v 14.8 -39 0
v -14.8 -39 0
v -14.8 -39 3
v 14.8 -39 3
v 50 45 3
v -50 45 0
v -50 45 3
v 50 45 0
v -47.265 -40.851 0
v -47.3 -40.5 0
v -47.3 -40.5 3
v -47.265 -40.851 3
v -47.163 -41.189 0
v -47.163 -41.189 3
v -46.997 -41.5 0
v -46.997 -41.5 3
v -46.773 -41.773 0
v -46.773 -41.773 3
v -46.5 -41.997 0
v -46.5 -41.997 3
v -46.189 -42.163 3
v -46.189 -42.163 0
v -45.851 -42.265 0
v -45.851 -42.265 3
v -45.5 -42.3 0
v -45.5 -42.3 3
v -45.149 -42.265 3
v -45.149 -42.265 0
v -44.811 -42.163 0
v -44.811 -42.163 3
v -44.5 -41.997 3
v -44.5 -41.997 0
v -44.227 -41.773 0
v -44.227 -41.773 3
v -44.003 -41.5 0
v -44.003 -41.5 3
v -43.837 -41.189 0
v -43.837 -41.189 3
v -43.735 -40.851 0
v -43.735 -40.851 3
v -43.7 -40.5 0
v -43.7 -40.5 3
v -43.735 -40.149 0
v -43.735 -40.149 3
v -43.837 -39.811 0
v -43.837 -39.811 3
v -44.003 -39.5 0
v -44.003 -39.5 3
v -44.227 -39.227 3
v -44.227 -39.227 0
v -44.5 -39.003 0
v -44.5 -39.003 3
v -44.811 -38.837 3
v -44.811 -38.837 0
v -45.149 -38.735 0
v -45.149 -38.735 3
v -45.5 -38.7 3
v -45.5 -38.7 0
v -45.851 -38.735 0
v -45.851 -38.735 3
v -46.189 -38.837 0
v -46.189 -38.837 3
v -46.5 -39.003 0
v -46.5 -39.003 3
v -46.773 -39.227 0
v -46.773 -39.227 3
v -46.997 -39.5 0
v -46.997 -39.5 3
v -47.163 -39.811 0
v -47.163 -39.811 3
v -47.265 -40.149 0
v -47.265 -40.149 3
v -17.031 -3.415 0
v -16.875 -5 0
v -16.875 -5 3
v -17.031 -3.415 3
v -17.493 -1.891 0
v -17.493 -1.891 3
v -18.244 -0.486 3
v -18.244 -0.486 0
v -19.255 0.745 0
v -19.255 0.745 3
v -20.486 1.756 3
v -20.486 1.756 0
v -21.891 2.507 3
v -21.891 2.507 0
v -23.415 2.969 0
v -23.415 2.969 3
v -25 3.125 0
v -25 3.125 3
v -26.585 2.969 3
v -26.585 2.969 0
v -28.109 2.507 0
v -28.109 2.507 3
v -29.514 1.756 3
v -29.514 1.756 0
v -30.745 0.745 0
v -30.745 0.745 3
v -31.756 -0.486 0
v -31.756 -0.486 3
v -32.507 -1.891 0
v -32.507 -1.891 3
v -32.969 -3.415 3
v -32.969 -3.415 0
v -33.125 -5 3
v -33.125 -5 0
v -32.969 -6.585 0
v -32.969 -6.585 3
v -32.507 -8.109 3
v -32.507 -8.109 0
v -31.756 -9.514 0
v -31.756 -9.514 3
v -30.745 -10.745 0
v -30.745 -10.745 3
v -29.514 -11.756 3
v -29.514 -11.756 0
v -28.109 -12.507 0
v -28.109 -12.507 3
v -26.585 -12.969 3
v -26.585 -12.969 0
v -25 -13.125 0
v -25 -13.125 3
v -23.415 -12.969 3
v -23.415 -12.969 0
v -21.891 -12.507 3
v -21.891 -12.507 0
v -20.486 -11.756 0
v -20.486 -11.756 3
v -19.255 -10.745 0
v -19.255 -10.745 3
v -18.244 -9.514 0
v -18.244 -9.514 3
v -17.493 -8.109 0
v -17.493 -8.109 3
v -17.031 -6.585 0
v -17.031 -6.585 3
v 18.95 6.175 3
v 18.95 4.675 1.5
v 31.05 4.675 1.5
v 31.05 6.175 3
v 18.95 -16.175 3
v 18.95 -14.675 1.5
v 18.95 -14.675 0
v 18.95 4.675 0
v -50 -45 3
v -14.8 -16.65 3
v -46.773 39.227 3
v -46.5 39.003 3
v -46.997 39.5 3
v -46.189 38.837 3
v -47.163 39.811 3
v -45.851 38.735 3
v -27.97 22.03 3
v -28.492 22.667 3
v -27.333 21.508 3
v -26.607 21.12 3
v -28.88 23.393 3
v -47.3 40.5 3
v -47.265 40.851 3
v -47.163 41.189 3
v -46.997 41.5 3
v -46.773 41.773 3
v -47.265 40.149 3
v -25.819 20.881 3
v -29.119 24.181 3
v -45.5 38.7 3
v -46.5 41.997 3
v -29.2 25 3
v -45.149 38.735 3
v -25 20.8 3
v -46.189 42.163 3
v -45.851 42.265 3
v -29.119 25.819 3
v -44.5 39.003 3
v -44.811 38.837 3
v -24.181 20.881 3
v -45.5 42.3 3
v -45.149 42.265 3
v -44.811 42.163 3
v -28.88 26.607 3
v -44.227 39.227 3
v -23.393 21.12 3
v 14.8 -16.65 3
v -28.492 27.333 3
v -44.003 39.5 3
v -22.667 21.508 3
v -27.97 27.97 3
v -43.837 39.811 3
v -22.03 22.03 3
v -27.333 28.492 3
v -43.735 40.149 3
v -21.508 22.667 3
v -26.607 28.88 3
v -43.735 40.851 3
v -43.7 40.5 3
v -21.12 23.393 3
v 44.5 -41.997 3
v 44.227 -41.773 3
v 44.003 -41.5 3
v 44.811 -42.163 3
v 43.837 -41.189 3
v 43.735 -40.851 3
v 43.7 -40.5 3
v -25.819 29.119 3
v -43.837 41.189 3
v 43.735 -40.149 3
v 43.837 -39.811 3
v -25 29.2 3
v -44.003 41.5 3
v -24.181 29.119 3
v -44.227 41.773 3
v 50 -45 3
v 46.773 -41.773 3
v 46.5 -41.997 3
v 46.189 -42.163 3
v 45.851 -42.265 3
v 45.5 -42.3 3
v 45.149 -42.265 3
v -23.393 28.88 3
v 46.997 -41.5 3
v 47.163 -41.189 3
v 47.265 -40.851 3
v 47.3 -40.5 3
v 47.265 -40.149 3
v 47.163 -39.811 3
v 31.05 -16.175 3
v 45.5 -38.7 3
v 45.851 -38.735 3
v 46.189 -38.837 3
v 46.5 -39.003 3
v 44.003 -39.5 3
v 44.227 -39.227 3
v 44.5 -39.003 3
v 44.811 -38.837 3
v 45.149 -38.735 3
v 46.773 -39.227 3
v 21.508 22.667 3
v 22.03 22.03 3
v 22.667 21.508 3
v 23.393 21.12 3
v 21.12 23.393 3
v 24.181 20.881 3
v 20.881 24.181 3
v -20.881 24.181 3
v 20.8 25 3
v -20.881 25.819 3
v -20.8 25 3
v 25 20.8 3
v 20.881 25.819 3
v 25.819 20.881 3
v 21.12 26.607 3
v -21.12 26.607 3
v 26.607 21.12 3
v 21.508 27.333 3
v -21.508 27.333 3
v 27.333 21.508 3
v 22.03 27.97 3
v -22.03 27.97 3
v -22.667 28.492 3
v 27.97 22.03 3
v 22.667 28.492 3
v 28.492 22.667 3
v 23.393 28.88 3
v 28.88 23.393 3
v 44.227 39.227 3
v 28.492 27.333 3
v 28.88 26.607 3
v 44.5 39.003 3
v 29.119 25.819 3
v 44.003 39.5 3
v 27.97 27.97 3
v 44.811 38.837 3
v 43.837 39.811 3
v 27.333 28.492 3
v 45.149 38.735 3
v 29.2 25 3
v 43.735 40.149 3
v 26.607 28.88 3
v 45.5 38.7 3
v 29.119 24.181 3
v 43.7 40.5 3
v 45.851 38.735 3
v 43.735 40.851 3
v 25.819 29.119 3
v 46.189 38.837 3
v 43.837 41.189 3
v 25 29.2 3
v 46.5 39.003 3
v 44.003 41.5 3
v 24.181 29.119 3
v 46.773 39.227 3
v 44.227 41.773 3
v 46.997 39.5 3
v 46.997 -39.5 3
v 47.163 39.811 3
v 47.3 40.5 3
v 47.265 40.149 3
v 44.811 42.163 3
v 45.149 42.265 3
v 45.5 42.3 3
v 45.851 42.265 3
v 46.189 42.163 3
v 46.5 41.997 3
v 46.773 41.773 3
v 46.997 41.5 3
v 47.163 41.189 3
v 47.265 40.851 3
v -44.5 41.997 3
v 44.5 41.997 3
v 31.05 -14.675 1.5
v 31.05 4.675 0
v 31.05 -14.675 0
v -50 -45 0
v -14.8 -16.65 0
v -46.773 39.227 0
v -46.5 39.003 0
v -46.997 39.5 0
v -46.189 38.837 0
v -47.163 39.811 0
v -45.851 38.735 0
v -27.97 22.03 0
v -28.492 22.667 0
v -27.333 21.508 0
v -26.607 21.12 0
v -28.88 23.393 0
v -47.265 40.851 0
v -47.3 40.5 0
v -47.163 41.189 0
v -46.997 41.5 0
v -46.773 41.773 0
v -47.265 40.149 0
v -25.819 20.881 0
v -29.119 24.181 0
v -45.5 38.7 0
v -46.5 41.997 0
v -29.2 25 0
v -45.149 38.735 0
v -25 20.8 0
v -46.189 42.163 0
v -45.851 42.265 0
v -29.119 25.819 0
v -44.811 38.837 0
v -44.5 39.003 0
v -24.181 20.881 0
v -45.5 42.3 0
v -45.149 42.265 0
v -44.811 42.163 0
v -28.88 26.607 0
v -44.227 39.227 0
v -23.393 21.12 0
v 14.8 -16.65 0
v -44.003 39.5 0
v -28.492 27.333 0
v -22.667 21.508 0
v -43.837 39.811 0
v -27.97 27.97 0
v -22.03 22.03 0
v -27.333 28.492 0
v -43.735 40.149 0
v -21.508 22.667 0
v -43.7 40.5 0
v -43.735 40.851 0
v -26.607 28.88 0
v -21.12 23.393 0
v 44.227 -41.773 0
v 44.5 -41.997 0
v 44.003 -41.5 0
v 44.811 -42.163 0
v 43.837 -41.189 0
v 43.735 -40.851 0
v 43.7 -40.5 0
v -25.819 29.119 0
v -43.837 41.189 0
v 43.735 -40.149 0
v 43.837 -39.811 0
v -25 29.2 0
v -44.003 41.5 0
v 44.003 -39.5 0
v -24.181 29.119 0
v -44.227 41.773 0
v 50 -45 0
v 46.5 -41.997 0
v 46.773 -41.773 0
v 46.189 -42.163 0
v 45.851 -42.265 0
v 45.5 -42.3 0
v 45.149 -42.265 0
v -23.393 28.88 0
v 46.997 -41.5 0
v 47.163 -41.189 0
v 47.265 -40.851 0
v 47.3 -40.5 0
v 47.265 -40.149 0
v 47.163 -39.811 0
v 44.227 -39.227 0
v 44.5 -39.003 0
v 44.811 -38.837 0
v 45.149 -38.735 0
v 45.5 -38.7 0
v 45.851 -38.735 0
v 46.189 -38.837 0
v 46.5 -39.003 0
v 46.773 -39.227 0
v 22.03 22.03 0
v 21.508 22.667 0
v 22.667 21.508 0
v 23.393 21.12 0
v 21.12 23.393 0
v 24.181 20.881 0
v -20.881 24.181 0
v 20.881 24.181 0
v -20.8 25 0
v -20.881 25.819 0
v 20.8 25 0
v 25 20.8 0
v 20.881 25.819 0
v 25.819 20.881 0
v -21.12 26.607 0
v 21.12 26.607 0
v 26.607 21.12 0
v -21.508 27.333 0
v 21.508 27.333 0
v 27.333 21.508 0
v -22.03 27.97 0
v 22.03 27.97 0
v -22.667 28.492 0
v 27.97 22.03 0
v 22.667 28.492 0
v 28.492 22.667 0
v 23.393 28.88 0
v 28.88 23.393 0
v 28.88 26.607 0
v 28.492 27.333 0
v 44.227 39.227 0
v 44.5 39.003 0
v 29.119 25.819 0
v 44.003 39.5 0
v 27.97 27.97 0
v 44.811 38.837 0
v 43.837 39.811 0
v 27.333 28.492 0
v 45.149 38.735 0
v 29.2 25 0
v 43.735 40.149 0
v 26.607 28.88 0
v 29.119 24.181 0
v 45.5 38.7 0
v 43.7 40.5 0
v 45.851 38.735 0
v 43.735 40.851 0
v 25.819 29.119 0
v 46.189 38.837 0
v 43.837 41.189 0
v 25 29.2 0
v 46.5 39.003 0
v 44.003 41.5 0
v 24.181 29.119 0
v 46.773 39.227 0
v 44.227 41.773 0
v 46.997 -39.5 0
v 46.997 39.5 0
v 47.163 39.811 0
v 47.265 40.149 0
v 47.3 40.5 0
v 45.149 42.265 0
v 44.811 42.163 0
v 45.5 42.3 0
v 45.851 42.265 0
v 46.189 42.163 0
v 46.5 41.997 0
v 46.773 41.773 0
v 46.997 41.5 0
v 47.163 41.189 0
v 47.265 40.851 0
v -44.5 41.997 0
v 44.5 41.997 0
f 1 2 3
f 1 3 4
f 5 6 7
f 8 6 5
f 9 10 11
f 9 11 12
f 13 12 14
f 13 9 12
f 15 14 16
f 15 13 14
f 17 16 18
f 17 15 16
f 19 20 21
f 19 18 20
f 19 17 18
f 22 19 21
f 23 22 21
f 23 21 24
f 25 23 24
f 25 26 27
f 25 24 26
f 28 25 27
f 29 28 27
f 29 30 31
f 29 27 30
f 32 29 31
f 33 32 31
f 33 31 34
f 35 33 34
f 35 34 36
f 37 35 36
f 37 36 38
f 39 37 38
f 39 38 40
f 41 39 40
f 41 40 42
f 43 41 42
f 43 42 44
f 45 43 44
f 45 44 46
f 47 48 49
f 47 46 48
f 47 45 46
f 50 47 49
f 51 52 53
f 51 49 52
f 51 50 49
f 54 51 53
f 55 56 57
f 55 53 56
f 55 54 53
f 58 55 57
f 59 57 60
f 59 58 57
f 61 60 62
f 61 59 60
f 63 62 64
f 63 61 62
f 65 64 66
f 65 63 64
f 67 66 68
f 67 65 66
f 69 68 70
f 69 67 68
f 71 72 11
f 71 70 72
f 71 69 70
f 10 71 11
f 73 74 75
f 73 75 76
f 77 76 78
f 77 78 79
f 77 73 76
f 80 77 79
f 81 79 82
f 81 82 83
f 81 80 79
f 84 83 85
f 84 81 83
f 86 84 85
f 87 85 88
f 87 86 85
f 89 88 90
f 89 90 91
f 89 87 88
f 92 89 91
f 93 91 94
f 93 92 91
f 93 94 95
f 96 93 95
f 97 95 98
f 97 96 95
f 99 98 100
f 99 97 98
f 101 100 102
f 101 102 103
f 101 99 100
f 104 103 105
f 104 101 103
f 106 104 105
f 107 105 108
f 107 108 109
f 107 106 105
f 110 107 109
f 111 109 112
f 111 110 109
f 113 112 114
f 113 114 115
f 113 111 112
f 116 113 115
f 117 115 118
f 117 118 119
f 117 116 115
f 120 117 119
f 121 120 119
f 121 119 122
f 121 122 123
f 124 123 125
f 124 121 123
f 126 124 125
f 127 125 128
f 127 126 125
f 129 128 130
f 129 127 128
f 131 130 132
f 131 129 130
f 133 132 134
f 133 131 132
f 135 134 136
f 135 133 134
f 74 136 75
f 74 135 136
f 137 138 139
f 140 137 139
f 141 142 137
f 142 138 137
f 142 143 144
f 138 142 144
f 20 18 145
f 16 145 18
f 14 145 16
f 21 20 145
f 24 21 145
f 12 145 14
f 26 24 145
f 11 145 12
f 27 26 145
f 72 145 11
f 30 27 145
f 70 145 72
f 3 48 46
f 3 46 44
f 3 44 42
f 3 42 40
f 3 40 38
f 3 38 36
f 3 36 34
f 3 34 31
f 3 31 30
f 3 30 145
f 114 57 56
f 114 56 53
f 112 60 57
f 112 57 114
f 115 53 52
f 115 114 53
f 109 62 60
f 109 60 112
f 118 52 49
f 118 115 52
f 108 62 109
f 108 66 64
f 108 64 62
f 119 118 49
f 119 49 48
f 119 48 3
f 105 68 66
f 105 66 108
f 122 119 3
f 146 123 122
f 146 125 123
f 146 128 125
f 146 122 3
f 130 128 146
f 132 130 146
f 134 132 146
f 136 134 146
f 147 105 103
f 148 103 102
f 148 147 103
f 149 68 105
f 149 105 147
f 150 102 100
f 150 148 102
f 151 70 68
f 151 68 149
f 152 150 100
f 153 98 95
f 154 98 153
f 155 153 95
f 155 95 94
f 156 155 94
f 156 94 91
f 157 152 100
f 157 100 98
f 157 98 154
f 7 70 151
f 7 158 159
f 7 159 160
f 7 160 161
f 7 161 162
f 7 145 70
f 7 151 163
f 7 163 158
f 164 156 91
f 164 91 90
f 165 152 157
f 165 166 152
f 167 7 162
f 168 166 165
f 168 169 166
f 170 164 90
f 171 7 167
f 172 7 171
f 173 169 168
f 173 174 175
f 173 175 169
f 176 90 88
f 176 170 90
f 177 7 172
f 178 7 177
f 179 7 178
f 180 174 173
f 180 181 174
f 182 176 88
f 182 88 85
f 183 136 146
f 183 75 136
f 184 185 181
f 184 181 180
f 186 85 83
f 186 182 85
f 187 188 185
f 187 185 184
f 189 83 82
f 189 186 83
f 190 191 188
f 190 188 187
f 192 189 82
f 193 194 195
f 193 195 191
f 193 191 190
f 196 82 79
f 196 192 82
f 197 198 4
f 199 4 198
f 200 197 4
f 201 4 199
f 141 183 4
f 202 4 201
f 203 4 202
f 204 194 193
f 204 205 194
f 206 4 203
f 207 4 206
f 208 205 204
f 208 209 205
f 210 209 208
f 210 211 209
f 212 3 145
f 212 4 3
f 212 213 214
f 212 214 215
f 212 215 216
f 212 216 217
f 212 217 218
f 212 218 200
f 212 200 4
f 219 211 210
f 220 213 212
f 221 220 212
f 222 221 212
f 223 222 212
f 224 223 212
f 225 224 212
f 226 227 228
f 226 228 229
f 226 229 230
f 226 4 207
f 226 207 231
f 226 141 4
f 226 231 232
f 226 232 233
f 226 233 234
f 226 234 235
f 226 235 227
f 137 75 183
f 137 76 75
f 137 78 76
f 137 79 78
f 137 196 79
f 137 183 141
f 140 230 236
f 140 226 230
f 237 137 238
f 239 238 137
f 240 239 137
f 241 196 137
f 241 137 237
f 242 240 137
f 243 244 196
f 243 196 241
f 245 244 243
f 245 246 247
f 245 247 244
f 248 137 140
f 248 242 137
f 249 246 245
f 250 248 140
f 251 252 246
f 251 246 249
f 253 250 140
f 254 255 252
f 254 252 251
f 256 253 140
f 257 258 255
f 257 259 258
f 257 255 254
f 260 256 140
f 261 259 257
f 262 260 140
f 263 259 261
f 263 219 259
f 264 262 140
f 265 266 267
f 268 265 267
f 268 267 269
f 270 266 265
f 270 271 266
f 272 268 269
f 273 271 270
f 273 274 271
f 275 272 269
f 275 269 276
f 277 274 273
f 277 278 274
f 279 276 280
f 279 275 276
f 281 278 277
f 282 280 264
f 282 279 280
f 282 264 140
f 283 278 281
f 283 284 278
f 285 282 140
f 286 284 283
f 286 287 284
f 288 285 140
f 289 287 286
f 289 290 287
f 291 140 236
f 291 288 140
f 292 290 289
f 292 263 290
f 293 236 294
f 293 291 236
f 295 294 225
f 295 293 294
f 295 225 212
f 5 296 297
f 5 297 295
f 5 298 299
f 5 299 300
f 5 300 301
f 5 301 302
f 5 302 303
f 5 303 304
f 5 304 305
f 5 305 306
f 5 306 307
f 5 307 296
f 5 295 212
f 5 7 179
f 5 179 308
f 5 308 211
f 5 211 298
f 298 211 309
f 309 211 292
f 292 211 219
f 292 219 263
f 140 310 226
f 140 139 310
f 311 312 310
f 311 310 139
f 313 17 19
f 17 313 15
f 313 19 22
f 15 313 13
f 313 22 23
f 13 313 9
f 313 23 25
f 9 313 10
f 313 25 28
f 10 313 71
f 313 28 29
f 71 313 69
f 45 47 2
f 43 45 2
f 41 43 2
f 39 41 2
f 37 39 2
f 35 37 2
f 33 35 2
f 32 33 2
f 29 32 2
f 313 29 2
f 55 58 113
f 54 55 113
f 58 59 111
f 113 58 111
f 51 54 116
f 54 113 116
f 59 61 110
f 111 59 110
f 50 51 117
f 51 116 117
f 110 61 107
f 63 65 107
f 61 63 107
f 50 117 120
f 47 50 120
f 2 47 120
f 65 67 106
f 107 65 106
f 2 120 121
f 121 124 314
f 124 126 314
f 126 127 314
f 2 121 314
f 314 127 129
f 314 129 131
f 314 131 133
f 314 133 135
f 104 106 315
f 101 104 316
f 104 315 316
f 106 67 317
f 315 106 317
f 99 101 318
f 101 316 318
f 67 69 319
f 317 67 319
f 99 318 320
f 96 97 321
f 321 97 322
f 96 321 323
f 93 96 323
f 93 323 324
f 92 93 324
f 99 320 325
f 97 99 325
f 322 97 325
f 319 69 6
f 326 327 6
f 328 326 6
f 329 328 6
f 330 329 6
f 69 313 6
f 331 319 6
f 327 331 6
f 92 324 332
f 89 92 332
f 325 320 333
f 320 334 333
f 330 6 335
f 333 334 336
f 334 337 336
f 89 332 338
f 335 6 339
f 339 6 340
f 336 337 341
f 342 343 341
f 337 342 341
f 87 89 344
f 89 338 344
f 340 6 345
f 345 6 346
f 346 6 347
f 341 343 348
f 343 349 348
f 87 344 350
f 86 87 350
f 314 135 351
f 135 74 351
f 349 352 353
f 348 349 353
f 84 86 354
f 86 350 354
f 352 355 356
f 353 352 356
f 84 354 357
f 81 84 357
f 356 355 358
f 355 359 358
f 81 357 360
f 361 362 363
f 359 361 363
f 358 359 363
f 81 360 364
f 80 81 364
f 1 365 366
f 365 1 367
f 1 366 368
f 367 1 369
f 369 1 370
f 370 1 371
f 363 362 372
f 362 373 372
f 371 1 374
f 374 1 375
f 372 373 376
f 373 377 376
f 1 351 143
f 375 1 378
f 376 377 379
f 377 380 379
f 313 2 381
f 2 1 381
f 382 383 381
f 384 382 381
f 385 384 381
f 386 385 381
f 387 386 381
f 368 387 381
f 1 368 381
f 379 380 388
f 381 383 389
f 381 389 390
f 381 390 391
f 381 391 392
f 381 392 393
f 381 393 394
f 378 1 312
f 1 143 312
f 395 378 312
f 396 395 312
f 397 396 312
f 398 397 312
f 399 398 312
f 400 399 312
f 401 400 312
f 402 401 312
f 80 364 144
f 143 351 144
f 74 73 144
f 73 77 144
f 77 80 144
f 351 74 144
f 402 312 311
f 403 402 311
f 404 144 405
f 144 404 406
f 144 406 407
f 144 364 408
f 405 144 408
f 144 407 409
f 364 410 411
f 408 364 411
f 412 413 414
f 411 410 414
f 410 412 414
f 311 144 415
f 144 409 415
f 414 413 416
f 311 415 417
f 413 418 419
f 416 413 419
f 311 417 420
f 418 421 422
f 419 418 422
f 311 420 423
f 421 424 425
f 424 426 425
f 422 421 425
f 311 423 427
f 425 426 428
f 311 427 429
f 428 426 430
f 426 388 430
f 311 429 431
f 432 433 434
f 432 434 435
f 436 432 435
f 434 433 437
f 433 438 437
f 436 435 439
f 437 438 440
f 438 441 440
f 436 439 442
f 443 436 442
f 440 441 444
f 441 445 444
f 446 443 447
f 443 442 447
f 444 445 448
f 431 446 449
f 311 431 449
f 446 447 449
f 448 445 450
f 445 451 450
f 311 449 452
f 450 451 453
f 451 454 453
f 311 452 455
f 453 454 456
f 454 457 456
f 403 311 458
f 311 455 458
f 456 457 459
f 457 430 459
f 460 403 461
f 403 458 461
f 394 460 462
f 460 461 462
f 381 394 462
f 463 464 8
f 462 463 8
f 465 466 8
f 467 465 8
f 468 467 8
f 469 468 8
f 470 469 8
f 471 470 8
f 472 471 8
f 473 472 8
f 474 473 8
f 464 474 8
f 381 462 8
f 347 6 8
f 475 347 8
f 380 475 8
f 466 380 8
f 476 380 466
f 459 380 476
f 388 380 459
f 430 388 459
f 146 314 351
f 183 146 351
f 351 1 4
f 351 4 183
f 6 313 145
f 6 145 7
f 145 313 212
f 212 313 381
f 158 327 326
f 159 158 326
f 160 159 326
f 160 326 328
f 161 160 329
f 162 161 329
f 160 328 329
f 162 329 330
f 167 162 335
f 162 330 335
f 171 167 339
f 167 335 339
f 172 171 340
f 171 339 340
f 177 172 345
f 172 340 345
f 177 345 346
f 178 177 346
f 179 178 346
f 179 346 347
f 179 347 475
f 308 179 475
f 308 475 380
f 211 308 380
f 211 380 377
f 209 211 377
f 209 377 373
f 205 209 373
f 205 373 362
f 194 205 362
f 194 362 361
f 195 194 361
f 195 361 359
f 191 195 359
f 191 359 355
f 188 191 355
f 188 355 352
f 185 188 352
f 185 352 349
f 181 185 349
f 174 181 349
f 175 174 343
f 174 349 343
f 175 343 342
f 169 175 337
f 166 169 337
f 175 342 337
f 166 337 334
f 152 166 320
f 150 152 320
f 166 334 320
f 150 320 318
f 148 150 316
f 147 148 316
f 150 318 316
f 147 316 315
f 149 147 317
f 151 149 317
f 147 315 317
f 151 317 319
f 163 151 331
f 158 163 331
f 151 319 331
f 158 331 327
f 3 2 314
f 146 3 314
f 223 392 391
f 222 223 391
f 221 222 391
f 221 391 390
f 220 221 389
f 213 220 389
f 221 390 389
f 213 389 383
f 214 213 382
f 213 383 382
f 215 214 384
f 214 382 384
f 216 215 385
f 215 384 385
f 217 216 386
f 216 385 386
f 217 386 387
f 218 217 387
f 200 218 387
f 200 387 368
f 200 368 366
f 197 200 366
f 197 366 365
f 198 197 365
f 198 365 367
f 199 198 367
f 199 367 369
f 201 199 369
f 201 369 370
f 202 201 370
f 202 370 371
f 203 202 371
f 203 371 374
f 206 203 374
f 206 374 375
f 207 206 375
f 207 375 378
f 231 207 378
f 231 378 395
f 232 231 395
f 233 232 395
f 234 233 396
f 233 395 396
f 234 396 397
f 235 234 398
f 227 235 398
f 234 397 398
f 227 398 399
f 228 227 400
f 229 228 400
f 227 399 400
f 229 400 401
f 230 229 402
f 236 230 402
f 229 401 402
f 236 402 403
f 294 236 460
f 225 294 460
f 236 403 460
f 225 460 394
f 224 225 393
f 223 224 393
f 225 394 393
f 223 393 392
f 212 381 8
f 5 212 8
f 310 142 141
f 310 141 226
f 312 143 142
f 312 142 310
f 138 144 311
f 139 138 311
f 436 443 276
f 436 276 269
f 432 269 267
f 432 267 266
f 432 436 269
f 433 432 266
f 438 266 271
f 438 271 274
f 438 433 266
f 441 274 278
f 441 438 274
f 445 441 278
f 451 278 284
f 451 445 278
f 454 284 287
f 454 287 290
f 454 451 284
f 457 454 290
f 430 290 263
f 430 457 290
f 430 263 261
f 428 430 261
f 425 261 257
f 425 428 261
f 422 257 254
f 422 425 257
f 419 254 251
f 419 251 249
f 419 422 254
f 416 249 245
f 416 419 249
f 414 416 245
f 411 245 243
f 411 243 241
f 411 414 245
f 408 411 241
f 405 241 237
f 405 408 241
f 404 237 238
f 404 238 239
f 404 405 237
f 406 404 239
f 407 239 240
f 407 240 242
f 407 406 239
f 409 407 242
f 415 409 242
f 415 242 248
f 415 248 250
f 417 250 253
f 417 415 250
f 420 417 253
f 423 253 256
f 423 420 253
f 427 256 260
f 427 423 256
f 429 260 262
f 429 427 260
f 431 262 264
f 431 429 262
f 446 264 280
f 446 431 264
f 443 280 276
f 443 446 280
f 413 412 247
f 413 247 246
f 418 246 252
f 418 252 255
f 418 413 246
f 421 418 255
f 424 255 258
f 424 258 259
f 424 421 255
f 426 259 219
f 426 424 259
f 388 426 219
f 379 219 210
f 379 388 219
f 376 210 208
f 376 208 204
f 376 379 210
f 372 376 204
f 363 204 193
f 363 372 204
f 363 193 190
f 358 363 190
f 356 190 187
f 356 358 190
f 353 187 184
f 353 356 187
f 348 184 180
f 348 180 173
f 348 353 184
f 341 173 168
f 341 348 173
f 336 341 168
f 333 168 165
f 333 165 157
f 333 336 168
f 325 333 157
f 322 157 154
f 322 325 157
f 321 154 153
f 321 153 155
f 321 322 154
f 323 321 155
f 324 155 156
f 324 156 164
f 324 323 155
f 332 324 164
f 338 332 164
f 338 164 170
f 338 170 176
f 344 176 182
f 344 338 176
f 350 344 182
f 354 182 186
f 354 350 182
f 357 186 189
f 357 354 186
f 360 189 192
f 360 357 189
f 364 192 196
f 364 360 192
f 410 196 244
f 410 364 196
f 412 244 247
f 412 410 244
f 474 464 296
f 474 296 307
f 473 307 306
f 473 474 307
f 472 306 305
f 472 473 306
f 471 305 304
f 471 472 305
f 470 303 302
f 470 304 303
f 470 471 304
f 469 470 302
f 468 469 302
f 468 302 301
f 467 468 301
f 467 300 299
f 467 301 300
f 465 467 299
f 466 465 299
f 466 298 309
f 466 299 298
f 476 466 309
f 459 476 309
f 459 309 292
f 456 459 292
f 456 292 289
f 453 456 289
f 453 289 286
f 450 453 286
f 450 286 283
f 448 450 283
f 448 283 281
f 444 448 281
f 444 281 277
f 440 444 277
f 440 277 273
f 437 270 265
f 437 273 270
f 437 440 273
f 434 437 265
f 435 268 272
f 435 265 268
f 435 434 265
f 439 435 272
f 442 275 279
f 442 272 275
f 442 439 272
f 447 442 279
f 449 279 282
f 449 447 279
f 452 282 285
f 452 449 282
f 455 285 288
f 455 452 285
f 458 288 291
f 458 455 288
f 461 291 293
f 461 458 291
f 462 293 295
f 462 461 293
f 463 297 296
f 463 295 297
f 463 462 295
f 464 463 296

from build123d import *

# Parameters (mm, degrees)
SKETCH1_W            = 100
SKETCH1_H            = 90
SKETCH1_R            = 4.2
SKETCH1_R_2          = 8.125
SKETCH1_W_2          = 29.6
SKETCH1_H_2          = 22.35
SKETCH1_W_3          = 12.1
SKETCH1_H_3          = 19.35
BOSS_EXTRUDE1_DEPTH  = 3
M3_CLEARANCE_HOLE1_D = 3.6
MIRROR2_COPY_1_D     = 3.6
CHAMFER1_SIZE        = 1.5


with BuildPart() as part:
    # Sketch1 → Boss-Extrude1 (new body)
    with BuildSketch(Plane.XY):
        Rectangle(SKETCH1_W, SKETCH1_H)
        with Locations((25, 25)):
            Circle(SKETCH1_R, mode=Mode.SUBTRACT)
        with Locations((-25, 25)):
            Circle(SKETCH1_R, mode=Mode.SUBTRACT)
        with Locations((-25, -5)):
            Circle(SKETCH1_R_2, mode=Mode.SUBTRACT)
        with Locations((0, -27.825)):
            Rectangle(SKETCH1_W_2, SKETCH1_H_2, mode=Mode.SUBTRACT)
        with Locations((25, -5)):
            Rectangle(SKETCH1_W_3, SKETCH1_H_3, mode=Mode.SUBTRACT)
    extrude(amount=BOSS_EXTRUDE1_DEPTH)

    # M3 Clearance Hole1 (through all)
    with Locations(Plane.XY.offset(3)):
        with Locations((-45.5, 40.5)):
            m3_clearance_hole1 = Hole(M3_CLEARANCE_HOLE1_D / 2)

    # Mirror1: M3 Clearance Hole1 across plane
    add(m3_clearance_hole1.mirror(Plane.ZX), mode=Mode.SUBTRACT)

    # Mirror2: M3 Clearance Hole1 across plane
    add(m3_clearance_hole1.mirror(Plane(origin=(0, 0, 0), x_dir=(0, 0, 1), z_dir=(1, 0, 0))), mode=Mode.SUBTRACT)

    # Mirror2 copy 1 (through all)
    with Locations(Plane(origin=(0, 0, 3), x_dir=(-1, 0, 0), z_dir=(0, 0, 1))):
        with Locations((-45.5, 40.5)):
            Hole(MIRROR2_COPY_1_D / 2)

    # Chamfer1
    chamfer1_edges = [part.edges().sort_by_distance(p)[0] for p in [
        (25, 4.675, 3),
        (25, -14.675, 3),
    ]]
    chamfer(chamfer1_edges, length=CHAMFER1_SIZE)


solid = part.part
